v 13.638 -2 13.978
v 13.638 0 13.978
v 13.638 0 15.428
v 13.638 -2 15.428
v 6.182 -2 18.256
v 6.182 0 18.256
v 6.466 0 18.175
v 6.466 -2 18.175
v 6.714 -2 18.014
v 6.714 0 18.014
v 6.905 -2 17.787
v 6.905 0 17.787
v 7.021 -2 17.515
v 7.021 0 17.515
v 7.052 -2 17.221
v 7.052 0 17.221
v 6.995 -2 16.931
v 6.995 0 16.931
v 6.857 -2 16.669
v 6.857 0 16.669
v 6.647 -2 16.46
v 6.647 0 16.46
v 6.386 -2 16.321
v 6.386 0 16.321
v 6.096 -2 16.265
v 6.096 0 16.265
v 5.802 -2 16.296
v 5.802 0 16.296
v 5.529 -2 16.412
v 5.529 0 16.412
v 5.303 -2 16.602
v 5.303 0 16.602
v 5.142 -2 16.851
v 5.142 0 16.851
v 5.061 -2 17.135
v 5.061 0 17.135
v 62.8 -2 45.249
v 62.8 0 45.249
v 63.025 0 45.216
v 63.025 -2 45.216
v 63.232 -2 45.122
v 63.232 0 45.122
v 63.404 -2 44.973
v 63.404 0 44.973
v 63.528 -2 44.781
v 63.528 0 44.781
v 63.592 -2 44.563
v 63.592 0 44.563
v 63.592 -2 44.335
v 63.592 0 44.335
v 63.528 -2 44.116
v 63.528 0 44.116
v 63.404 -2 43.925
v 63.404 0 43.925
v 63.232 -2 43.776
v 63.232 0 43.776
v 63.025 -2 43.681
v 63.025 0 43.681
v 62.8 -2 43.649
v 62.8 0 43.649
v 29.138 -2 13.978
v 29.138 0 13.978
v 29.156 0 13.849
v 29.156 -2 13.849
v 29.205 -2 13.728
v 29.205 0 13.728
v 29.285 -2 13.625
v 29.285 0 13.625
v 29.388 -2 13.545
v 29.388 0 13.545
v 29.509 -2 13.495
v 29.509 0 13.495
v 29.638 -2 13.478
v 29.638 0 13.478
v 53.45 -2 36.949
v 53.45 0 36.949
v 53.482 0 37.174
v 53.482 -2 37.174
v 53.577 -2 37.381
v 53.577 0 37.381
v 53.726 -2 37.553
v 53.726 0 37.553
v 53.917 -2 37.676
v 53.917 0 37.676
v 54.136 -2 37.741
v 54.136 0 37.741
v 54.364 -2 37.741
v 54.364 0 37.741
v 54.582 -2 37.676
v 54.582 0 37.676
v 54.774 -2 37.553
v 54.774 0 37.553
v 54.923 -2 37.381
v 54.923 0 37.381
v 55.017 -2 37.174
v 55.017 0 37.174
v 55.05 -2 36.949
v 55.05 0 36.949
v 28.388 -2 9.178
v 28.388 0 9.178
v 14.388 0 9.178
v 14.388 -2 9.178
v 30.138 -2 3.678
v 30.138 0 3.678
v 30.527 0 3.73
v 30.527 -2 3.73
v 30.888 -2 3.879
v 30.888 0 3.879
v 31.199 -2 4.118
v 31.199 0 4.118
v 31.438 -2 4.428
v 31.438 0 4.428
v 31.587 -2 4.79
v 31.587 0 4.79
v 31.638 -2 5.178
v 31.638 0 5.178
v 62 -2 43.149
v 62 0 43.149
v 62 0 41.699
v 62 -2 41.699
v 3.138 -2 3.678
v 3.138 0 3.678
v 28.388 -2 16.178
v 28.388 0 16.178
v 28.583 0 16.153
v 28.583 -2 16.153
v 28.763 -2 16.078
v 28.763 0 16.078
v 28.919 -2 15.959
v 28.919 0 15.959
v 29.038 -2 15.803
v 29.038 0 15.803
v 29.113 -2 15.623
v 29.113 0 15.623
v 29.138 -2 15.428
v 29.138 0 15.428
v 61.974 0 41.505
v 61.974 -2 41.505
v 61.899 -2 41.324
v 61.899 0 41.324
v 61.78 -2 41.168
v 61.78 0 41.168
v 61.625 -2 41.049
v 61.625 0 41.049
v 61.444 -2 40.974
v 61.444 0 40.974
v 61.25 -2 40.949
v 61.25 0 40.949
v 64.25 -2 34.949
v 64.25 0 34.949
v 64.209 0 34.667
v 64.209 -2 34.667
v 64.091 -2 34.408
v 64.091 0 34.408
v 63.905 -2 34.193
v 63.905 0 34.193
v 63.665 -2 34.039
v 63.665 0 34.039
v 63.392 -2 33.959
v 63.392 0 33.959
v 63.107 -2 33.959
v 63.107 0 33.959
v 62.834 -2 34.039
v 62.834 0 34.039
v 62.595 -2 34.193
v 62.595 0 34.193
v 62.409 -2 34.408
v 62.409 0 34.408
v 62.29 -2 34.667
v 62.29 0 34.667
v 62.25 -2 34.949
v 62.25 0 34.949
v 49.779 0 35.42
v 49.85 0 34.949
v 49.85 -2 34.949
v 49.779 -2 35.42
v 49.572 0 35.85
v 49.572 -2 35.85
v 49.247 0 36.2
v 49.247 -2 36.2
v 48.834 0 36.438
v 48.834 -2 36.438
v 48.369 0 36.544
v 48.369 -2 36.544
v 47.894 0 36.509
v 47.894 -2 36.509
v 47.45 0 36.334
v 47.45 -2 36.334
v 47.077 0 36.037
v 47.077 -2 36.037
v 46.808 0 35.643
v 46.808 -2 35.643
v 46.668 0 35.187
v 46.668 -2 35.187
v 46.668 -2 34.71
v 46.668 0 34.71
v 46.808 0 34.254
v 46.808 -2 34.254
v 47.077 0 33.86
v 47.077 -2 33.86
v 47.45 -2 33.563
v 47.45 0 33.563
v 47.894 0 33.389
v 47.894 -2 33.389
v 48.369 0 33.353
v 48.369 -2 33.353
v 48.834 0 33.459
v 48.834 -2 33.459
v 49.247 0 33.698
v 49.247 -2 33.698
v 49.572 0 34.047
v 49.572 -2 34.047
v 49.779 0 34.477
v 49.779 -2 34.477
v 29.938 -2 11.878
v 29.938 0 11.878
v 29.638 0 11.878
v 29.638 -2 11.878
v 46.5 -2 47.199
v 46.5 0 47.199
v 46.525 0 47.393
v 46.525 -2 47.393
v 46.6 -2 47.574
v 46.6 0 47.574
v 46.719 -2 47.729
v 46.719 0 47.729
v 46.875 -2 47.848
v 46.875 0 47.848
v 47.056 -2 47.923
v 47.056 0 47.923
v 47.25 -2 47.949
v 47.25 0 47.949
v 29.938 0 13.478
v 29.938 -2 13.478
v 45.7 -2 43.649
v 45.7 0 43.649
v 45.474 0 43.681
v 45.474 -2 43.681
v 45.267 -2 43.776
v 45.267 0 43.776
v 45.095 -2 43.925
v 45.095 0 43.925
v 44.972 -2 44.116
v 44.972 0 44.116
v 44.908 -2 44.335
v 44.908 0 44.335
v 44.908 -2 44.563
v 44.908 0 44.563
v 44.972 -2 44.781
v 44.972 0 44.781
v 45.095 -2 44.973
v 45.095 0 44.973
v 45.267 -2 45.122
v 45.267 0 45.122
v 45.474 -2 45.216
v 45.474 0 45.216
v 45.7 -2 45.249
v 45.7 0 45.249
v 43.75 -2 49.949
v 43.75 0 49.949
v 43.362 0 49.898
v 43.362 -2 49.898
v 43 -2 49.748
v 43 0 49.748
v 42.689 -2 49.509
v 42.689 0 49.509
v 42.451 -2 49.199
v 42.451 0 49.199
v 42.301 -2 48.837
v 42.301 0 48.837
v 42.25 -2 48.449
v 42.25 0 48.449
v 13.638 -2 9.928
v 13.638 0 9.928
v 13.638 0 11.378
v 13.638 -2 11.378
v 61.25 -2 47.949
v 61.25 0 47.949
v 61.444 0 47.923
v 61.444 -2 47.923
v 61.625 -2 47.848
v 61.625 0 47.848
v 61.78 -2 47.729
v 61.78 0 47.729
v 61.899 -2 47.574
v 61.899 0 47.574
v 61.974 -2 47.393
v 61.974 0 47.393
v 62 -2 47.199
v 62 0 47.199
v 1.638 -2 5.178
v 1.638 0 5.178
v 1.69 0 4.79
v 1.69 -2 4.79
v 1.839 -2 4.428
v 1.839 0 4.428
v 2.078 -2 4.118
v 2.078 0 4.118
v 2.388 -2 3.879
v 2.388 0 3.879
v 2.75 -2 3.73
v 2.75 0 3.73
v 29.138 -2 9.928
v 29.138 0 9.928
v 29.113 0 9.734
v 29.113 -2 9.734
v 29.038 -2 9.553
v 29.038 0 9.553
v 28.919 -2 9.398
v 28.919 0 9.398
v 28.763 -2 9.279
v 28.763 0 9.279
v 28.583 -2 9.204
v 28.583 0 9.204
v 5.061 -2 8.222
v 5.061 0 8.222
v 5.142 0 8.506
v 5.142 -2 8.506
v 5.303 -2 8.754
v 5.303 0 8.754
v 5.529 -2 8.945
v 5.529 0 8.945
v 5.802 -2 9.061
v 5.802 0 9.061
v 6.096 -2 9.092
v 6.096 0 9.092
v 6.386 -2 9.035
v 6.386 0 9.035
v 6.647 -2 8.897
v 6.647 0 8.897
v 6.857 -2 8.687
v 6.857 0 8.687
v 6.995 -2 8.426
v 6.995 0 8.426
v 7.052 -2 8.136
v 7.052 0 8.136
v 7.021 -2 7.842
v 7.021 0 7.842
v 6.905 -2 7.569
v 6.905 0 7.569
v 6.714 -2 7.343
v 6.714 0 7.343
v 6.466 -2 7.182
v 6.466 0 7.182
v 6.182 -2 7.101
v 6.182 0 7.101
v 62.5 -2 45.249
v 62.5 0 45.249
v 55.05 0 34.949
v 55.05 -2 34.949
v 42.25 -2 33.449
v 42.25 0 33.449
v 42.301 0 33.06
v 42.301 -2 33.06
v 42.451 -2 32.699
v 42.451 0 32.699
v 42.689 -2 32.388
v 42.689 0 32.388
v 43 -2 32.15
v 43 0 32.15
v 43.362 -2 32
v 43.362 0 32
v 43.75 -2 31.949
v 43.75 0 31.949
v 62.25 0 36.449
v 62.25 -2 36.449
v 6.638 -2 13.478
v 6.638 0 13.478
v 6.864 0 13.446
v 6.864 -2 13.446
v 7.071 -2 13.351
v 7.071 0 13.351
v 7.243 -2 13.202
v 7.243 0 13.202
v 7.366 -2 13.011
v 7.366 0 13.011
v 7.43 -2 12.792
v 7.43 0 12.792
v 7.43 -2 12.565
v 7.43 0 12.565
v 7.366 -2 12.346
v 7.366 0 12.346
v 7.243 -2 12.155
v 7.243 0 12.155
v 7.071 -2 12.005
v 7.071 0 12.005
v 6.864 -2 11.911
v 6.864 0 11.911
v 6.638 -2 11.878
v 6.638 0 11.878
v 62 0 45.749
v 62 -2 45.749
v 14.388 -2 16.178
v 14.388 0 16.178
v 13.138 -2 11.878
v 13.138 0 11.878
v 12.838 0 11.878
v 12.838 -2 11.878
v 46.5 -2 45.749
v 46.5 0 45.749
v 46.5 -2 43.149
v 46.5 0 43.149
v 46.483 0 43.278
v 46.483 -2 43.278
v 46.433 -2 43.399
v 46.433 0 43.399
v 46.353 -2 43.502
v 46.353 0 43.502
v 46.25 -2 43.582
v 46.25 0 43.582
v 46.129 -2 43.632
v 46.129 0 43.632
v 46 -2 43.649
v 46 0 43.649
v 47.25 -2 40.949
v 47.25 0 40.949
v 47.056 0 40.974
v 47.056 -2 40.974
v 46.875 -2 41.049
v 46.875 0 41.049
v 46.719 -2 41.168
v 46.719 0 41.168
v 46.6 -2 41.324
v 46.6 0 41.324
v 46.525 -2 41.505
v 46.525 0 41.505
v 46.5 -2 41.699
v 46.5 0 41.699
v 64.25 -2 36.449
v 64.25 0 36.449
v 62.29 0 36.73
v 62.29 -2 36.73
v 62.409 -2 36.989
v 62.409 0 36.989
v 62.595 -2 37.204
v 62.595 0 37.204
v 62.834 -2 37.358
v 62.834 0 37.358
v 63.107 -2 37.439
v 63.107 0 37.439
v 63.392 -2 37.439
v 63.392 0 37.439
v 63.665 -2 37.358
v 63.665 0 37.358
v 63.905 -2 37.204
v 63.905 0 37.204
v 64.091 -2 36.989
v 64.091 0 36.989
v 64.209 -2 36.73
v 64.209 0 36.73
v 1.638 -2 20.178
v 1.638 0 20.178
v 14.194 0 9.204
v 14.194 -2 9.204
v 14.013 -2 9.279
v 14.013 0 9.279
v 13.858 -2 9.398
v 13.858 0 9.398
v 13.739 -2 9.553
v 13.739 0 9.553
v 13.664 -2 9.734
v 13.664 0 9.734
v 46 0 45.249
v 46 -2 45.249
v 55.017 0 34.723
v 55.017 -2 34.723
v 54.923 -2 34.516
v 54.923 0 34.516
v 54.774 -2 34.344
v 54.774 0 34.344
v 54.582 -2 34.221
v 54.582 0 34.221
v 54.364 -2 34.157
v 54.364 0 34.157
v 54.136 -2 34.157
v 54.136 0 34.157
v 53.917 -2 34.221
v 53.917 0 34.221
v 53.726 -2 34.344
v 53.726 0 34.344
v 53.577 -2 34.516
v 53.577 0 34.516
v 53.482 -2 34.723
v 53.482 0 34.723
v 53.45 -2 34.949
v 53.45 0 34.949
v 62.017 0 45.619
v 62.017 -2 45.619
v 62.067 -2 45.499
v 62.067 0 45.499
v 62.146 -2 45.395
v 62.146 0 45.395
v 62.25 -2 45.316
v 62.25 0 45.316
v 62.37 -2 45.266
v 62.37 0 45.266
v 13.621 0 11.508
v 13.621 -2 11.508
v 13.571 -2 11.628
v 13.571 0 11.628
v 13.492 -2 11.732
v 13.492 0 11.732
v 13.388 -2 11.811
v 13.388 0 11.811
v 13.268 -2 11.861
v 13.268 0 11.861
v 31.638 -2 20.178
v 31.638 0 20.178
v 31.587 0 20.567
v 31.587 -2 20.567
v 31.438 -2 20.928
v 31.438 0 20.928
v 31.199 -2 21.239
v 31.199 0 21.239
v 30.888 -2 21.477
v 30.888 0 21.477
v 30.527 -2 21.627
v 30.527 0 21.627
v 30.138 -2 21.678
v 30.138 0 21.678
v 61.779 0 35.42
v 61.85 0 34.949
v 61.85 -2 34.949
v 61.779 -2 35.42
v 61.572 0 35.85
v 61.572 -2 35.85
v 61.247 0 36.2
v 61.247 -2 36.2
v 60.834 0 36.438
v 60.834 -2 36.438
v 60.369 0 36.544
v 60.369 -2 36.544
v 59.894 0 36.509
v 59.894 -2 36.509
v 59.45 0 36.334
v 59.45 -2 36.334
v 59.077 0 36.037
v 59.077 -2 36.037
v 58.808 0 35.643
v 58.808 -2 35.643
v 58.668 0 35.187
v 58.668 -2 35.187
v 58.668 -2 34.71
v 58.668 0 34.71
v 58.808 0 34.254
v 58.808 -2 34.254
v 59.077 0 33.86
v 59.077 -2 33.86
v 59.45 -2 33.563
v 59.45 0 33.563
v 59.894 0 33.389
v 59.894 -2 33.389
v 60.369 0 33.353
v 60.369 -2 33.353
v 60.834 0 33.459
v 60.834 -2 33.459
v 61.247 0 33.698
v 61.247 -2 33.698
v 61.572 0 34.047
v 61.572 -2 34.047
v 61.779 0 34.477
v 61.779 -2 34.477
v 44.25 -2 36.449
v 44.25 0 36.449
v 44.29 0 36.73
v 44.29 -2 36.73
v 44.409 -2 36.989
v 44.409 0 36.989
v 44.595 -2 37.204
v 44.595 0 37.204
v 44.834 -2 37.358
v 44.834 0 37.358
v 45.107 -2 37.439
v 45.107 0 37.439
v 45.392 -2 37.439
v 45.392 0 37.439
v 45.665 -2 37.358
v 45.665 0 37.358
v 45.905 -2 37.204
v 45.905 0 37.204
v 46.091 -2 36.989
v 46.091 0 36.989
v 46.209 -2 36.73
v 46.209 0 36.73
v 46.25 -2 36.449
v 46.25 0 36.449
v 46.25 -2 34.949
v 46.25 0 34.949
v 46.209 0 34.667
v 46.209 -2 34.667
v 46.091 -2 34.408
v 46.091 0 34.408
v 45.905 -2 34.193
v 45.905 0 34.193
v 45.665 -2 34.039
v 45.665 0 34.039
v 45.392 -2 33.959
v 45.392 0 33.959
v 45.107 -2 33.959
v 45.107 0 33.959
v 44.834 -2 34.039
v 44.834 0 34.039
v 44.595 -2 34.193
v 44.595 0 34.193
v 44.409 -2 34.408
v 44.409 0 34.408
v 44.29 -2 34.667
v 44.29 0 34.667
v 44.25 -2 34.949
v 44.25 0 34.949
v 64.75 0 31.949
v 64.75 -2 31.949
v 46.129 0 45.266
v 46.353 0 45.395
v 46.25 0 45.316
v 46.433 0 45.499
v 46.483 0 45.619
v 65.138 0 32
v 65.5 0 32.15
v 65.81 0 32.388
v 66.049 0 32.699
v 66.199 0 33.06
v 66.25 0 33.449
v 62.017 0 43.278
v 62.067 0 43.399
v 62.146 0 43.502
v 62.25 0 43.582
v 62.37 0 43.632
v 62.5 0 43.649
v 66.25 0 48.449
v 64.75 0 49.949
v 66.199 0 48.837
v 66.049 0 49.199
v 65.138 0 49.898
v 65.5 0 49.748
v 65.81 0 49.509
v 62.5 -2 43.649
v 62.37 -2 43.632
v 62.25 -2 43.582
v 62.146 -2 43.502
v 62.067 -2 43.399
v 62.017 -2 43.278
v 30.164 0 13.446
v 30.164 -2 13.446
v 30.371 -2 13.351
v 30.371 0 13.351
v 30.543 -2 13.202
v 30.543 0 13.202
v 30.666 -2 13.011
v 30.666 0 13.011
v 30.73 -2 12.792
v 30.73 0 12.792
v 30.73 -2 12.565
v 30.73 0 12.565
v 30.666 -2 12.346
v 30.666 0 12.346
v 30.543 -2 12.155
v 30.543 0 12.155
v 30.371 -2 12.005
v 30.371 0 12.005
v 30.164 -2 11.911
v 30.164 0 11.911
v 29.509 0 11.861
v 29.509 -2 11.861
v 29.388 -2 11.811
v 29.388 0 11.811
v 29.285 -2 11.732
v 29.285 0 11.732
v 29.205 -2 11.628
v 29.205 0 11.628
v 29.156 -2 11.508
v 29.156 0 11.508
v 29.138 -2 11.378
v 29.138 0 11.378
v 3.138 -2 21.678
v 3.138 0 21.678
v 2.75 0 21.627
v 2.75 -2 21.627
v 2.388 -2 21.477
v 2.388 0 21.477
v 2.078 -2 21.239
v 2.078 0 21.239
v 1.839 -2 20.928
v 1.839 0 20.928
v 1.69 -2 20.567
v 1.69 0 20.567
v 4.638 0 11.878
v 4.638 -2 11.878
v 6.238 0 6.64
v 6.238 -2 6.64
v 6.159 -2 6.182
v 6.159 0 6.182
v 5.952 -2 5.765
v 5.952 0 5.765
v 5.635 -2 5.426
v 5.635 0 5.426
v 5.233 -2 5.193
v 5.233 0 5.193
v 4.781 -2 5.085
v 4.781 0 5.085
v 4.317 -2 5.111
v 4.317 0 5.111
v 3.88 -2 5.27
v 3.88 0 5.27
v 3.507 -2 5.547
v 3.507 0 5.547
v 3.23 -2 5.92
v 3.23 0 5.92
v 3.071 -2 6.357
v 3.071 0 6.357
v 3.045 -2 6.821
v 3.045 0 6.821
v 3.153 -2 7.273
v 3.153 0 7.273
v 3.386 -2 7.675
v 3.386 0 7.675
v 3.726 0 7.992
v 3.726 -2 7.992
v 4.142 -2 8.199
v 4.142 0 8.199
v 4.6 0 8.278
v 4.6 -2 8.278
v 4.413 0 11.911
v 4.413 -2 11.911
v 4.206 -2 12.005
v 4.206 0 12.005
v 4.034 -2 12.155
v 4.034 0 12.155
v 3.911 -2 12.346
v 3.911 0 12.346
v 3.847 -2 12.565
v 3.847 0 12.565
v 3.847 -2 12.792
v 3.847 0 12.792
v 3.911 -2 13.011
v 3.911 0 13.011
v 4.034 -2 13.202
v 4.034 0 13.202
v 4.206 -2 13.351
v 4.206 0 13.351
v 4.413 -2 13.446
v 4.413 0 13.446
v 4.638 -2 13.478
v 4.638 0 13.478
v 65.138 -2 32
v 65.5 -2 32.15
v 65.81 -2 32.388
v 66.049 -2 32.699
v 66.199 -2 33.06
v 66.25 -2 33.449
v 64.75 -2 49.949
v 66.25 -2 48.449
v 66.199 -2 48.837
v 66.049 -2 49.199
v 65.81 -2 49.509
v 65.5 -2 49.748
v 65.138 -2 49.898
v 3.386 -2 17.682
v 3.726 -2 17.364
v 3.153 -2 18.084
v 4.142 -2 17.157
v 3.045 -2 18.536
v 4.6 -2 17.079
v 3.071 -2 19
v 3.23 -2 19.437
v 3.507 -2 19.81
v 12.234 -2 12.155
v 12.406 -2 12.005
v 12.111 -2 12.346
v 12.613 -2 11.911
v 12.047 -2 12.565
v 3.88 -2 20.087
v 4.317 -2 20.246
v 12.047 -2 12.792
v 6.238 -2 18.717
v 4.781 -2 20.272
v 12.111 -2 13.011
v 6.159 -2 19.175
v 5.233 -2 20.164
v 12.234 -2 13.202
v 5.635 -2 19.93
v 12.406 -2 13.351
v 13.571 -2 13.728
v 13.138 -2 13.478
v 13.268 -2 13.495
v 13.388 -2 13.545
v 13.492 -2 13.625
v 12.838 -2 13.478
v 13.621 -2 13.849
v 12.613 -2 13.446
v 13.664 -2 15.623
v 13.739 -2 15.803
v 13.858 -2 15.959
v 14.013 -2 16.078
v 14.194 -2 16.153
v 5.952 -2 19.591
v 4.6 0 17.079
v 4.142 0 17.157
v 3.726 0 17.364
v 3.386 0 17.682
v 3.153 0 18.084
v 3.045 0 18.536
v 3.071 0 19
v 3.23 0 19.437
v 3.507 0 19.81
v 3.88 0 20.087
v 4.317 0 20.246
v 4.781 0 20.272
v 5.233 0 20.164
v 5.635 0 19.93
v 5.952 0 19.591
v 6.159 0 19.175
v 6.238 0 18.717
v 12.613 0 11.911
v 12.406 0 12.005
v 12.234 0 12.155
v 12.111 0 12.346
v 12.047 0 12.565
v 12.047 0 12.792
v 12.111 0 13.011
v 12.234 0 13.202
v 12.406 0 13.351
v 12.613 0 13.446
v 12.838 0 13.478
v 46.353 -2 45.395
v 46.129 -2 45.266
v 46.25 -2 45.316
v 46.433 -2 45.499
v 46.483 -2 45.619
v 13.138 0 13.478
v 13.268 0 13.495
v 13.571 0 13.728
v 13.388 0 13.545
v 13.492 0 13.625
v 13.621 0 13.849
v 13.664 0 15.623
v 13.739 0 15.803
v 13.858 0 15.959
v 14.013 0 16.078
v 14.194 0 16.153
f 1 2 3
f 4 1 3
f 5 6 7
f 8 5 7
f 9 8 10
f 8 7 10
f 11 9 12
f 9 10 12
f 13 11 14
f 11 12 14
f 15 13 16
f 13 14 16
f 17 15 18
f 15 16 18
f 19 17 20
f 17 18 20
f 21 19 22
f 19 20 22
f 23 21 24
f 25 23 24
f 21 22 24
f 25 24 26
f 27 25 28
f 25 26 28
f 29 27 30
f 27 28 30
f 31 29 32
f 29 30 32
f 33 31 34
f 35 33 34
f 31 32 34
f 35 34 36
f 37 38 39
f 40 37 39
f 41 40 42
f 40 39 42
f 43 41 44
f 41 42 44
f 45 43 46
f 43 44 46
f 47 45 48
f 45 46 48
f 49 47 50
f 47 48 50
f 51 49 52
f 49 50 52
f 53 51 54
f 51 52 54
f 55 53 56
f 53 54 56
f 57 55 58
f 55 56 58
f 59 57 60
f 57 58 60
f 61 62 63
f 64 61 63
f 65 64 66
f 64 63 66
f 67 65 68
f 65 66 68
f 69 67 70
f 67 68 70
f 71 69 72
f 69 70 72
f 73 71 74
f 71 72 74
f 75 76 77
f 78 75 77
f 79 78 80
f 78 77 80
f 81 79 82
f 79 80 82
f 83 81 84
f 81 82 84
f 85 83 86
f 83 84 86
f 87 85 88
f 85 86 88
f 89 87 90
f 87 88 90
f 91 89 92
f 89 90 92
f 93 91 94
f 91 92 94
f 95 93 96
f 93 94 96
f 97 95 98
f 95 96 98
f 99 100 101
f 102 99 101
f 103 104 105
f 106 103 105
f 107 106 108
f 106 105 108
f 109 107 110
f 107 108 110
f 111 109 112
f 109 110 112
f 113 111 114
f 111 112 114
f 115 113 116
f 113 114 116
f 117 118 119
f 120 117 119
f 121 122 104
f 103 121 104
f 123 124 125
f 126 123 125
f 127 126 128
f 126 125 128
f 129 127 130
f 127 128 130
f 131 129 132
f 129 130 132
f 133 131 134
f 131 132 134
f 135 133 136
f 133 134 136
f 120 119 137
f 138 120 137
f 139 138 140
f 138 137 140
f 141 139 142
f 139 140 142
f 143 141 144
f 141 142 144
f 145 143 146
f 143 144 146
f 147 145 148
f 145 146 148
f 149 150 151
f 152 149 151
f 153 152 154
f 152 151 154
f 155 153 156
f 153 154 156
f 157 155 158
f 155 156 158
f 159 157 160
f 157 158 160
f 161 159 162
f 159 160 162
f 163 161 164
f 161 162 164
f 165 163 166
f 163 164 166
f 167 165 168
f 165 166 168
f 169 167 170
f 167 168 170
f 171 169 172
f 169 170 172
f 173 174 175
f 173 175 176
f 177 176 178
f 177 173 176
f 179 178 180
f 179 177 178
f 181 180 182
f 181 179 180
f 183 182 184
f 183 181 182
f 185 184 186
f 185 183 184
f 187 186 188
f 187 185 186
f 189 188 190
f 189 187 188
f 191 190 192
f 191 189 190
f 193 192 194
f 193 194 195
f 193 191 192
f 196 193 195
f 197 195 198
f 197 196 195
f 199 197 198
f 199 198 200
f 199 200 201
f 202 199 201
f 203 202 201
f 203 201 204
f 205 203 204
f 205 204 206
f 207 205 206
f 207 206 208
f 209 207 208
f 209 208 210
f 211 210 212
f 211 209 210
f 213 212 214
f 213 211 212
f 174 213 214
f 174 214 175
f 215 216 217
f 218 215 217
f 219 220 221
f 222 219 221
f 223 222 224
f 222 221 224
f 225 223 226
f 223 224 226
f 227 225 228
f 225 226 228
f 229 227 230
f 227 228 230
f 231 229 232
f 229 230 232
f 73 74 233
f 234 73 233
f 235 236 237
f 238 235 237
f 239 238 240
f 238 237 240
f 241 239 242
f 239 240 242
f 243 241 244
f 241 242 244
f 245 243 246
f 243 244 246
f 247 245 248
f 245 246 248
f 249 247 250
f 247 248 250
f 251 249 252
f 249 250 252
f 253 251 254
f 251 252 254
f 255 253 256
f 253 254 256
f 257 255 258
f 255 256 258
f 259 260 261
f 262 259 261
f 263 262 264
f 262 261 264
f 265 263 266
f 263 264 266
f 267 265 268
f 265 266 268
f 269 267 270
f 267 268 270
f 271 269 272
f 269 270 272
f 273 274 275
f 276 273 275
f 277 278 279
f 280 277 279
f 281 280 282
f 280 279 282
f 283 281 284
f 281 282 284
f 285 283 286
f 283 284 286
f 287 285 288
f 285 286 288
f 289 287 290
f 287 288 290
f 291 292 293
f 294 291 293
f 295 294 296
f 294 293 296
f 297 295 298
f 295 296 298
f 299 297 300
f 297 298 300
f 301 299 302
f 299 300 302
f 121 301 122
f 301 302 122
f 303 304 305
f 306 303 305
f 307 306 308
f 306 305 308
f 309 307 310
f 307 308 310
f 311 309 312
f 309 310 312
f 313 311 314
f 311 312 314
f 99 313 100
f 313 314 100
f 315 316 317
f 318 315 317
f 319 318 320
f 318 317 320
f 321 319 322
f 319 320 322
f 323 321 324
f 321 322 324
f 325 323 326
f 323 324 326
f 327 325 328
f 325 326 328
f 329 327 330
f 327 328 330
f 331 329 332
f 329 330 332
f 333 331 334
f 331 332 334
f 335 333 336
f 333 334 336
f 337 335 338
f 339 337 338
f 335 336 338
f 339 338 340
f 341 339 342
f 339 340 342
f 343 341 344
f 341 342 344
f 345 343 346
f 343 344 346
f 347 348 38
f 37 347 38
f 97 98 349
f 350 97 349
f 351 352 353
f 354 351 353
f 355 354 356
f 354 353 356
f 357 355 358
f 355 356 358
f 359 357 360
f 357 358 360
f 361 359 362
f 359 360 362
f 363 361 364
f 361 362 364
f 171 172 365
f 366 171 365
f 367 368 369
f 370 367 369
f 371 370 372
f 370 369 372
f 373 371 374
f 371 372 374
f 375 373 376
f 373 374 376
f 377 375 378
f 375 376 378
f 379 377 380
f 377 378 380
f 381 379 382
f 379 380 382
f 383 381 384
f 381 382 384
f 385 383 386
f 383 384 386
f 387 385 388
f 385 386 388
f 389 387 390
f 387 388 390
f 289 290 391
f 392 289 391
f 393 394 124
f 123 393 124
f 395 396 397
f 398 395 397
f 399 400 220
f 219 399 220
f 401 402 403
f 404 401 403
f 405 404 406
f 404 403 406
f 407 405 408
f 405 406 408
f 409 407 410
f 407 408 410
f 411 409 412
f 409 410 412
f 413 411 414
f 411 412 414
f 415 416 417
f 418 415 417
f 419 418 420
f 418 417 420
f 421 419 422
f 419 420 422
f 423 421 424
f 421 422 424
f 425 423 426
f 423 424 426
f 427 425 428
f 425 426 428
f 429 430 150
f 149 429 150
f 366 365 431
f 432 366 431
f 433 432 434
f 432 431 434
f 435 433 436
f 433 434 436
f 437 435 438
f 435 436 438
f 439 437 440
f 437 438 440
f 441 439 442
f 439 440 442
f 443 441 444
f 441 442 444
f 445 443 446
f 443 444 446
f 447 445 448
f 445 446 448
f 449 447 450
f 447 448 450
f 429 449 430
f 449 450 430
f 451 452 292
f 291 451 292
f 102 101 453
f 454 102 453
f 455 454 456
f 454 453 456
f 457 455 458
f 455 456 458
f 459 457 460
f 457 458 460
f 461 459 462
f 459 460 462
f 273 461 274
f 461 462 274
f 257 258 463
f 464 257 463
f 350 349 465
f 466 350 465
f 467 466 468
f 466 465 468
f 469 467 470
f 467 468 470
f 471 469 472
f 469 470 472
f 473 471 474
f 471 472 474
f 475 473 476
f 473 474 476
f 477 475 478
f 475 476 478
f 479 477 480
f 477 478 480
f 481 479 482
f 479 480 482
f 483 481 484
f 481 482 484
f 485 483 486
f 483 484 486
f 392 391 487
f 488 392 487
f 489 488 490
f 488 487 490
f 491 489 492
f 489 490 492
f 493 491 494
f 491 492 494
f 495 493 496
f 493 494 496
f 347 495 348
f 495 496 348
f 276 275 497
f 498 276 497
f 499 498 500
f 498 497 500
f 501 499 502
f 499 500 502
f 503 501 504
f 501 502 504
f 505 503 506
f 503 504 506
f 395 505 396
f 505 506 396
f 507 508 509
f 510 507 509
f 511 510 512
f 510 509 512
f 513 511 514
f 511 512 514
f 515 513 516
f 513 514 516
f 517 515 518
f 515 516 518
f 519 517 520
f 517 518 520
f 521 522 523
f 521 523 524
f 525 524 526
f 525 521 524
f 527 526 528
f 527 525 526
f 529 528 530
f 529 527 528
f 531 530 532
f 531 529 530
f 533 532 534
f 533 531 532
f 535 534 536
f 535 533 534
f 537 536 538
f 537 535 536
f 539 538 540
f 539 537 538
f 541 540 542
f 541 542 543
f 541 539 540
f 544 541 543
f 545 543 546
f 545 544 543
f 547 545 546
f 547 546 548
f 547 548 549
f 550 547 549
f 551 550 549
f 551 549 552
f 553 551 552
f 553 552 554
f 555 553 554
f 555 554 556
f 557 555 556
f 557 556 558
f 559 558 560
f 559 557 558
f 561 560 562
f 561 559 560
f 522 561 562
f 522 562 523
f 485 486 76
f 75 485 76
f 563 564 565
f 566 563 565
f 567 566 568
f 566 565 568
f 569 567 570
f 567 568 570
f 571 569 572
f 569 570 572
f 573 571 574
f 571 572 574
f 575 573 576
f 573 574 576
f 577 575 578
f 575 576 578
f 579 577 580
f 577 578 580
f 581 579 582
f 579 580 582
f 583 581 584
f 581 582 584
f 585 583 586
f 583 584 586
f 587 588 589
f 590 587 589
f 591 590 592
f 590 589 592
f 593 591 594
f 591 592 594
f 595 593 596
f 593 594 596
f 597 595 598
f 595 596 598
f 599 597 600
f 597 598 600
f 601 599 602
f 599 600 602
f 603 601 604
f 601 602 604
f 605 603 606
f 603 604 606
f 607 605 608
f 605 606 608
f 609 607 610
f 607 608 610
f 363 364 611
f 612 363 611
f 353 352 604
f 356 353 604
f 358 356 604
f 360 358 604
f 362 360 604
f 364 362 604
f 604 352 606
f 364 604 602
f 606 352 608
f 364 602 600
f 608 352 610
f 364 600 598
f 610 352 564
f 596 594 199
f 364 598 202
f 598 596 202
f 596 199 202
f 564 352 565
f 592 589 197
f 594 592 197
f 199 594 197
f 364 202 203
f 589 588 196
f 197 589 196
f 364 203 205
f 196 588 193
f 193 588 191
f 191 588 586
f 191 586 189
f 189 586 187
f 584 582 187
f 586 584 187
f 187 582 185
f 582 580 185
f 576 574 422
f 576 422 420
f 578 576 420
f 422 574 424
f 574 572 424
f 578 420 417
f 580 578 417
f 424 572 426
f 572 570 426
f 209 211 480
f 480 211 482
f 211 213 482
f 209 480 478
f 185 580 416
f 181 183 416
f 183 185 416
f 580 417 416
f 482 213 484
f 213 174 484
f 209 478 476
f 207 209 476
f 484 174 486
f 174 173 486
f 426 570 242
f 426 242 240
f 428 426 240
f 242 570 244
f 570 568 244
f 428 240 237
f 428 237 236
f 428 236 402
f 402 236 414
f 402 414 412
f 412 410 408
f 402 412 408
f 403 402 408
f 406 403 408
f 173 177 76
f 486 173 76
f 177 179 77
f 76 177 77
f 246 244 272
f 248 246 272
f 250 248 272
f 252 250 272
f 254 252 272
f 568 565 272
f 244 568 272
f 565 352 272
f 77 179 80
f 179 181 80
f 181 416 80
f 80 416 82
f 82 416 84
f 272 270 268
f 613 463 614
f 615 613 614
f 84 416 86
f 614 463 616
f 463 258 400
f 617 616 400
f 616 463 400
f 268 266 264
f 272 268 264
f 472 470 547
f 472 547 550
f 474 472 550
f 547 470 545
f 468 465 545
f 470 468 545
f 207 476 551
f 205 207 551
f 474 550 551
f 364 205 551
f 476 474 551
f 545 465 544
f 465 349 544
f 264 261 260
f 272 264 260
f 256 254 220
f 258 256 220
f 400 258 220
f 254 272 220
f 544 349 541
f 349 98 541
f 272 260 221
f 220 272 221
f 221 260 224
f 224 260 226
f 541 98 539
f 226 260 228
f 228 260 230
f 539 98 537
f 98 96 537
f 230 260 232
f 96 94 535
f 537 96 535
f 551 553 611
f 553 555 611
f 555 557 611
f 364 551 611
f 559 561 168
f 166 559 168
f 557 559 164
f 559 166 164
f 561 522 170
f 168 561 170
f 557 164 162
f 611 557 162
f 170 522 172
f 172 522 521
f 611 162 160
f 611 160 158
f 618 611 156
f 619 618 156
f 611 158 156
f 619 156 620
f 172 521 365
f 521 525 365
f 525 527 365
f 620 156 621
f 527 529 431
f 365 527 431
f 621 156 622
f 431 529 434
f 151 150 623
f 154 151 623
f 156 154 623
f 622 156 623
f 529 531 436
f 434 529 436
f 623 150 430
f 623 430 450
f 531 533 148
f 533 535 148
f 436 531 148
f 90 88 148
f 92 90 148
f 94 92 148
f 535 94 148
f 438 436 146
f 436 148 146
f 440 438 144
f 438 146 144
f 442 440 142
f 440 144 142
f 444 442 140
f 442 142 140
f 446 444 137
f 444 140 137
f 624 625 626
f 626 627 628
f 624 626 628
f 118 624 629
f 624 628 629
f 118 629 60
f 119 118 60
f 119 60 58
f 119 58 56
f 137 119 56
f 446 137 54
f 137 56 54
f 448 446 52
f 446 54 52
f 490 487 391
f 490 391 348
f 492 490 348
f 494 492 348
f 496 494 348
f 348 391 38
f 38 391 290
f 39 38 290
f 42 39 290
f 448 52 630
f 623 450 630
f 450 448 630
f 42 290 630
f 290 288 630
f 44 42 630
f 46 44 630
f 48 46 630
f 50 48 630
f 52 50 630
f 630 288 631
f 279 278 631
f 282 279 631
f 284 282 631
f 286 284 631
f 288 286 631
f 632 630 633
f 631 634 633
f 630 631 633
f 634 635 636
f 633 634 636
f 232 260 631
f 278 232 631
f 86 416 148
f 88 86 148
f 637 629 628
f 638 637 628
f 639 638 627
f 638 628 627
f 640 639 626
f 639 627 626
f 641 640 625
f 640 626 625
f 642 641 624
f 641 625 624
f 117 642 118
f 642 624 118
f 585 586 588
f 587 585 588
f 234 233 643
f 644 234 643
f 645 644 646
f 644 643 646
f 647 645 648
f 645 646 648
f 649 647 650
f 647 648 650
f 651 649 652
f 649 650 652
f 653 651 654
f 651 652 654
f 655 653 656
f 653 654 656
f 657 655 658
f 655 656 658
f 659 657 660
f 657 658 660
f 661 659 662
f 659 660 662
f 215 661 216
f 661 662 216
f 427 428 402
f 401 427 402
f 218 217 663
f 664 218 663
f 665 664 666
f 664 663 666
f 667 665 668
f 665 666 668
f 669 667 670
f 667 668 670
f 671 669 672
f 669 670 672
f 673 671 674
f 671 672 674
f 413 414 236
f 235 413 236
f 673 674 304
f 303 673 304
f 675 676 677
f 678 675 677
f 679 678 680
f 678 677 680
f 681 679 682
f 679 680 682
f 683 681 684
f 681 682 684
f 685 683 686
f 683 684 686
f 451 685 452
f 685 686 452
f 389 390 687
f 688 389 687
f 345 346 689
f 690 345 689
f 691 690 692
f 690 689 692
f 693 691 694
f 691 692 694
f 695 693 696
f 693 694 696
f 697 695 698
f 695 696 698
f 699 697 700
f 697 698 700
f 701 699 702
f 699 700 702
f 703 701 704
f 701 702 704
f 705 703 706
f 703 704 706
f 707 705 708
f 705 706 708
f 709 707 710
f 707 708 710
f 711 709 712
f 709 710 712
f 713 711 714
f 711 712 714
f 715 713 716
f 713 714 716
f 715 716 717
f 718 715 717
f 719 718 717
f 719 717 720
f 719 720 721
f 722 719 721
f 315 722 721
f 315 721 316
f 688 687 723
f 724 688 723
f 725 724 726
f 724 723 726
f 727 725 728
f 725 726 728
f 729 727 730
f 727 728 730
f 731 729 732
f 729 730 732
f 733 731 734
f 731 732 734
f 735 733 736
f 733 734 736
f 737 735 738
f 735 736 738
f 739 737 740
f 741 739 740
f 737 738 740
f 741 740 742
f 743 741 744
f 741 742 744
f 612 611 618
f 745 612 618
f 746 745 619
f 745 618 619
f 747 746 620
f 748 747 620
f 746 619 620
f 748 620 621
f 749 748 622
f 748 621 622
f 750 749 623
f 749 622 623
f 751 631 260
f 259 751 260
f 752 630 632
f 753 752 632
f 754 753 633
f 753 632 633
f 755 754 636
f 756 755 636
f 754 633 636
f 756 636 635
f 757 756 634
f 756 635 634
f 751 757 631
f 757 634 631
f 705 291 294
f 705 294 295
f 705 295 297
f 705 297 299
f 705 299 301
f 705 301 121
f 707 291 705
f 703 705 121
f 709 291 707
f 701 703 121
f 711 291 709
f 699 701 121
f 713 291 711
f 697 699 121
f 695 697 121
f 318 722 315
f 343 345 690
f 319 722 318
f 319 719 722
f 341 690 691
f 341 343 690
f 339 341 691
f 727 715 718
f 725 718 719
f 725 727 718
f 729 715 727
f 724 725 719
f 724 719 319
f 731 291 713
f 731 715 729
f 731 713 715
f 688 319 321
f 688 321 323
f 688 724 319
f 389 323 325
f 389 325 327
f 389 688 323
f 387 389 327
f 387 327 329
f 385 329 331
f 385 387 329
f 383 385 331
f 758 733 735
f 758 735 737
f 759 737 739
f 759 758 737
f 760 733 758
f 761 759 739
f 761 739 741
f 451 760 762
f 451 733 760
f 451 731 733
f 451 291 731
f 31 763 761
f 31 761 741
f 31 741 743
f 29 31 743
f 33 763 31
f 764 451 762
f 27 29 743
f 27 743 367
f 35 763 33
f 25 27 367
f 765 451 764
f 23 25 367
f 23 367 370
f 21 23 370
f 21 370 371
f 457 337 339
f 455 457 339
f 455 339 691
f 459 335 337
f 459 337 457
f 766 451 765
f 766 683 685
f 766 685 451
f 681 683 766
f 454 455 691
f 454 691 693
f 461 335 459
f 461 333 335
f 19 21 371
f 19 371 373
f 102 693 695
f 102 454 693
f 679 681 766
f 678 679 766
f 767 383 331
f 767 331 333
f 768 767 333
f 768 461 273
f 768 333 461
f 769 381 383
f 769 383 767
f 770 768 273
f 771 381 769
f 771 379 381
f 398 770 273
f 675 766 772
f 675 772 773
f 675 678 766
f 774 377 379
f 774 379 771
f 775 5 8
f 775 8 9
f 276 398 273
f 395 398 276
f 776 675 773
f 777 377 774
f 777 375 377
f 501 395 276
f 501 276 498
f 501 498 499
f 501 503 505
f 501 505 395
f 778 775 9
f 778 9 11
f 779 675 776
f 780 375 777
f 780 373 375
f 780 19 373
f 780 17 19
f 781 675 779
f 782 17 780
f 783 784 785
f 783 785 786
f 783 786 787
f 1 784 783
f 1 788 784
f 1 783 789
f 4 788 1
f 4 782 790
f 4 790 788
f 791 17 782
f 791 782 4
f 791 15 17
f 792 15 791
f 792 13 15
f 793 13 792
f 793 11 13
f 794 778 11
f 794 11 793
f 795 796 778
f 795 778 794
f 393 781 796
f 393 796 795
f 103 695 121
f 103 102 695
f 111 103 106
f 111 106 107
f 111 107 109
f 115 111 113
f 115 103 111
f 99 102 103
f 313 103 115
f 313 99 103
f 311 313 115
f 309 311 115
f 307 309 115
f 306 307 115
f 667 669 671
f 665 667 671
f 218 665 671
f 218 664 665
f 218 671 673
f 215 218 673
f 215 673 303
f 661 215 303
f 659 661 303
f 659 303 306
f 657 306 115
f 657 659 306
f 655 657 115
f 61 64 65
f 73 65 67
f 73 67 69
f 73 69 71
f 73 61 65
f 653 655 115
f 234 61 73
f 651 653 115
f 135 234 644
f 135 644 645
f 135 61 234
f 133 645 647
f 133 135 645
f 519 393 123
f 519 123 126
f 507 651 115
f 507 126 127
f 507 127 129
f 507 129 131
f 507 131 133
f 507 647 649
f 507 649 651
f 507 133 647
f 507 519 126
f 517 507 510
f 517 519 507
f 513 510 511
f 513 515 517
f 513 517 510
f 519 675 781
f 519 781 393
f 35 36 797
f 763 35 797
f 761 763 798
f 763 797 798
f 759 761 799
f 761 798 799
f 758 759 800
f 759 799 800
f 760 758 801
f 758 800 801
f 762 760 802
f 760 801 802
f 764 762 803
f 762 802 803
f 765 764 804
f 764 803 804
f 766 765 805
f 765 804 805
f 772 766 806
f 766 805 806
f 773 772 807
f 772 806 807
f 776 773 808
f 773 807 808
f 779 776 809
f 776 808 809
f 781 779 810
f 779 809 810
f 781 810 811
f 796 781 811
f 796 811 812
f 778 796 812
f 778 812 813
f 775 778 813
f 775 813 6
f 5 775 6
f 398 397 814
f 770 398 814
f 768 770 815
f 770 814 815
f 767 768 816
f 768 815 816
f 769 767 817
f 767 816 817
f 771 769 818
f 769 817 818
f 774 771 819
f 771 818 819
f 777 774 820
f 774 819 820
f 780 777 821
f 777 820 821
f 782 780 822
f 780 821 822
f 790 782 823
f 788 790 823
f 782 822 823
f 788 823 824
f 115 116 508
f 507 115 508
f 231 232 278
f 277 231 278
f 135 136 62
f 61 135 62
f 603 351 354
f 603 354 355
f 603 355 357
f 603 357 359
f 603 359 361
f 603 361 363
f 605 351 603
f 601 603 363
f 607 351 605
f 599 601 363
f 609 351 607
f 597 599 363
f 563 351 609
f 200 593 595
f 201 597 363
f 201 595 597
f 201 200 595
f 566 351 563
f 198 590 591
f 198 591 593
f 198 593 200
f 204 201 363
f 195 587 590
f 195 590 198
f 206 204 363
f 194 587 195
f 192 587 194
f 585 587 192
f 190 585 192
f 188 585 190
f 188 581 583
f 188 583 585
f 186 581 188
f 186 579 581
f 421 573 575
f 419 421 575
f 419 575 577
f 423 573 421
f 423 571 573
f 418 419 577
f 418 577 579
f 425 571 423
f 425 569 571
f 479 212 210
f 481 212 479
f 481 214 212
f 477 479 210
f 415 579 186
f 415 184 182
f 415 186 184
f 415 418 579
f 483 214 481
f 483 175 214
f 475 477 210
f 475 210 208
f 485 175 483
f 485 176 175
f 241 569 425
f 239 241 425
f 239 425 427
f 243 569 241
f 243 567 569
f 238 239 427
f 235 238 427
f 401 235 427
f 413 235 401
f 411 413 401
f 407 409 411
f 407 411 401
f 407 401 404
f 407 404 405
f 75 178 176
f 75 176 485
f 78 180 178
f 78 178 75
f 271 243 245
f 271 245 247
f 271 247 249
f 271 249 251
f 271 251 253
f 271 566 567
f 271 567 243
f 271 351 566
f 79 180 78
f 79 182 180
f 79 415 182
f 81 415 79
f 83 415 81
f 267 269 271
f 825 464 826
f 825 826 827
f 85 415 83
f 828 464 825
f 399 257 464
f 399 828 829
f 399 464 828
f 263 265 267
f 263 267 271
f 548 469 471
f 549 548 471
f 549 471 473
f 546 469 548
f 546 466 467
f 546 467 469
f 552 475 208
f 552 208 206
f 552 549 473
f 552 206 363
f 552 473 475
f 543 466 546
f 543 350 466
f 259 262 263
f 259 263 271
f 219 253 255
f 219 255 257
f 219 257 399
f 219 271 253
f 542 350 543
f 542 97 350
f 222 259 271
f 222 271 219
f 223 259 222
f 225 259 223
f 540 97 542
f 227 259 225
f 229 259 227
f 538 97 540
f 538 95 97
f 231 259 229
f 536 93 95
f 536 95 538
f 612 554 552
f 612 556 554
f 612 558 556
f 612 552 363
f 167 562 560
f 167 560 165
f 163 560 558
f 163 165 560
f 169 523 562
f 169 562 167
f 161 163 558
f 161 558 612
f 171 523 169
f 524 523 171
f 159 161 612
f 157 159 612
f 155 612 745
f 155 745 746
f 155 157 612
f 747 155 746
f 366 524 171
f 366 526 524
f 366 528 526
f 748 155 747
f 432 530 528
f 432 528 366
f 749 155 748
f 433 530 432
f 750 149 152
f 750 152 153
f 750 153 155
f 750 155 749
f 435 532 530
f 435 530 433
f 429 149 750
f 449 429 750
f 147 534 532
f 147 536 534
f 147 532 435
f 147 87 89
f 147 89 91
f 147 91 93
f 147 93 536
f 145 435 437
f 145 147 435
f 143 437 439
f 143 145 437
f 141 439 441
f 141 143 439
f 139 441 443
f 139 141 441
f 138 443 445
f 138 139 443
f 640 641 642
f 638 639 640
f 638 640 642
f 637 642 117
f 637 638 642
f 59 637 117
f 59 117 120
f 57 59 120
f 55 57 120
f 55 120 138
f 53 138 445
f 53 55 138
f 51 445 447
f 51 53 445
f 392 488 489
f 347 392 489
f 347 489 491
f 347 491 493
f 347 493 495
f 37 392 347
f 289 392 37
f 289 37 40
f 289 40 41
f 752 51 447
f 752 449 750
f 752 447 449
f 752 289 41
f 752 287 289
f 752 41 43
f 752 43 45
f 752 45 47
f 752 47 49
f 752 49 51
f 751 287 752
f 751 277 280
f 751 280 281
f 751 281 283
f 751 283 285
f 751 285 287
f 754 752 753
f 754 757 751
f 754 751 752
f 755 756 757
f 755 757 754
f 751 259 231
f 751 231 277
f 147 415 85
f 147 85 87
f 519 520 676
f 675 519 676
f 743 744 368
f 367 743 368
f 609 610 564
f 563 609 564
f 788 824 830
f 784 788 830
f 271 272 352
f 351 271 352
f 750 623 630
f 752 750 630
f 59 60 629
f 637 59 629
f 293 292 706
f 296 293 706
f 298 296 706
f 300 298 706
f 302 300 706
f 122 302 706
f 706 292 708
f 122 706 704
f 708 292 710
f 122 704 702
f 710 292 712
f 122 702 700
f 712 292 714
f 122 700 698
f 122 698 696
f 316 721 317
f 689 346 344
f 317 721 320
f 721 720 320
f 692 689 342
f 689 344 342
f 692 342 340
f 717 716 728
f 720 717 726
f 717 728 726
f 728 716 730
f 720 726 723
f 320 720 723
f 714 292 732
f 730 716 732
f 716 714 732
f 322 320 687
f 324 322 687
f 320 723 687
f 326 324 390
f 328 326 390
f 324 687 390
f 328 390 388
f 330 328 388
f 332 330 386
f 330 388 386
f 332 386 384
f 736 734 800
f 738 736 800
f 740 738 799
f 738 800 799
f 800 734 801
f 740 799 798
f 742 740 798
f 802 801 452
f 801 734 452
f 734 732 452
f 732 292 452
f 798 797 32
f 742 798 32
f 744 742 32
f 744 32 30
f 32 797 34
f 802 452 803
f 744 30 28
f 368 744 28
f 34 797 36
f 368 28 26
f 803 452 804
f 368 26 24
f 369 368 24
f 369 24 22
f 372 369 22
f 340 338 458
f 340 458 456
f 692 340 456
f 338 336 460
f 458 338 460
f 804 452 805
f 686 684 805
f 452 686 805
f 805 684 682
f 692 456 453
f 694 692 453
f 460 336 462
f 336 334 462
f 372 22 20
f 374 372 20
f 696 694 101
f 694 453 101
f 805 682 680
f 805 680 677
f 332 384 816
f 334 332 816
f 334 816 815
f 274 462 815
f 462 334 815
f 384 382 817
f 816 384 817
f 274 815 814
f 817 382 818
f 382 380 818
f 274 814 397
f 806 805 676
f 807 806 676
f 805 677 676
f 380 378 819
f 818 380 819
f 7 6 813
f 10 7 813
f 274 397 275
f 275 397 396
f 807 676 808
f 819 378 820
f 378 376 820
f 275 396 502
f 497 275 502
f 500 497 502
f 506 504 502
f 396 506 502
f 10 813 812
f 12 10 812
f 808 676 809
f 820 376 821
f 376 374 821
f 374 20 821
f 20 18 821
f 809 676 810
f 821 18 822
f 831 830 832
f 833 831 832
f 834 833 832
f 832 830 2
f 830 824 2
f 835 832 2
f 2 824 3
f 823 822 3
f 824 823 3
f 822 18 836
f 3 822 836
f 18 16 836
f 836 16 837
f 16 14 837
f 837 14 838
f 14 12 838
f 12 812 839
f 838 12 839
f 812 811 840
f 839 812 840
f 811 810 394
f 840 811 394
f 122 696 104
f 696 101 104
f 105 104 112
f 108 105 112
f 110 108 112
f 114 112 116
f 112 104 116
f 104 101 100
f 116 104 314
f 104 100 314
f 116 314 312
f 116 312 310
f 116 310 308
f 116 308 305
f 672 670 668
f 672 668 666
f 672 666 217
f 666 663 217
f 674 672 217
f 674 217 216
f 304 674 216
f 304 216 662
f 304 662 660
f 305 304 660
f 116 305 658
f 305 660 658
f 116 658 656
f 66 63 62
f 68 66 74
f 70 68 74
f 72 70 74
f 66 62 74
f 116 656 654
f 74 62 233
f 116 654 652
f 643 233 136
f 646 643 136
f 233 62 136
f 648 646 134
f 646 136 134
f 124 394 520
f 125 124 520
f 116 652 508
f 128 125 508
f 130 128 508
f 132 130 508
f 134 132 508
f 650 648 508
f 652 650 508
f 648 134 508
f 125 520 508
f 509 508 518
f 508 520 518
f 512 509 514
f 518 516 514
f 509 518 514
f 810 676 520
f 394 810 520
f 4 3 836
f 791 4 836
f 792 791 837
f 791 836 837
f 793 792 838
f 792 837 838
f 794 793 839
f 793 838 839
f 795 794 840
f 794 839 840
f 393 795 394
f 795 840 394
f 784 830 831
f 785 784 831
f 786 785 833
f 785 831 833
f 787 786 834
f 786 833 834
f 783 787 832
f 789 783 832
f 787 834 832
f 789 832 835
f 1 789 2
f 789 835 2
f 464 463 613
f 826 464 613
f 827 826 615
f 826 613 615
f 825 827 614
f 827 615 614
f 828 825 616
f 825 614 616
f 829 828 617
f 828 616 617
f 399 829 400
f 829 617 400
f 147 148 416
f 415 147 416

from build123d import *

# Parameters (mm, degrees)
F0_R     = 1.6
F1_DEPTH = 2
F2_DEPTH = 2


with BuildPart() as f1:
    # F0 (on Front) → F1 (new body)
    with BuildSketch(Plane.XZ):
        with BuildLine():
            Line((64.749799, 49.948693), (43.749799, 49.948693))
            ThreePointArc((43.749799, 49.948693), (42.689139, 49.509353), (42.249799, 48.448693))
            Line((42.249799, 48.448693), (42.249799, 33.448693))
            ThreePointArc((42.249799, 33.448693), (42.689139, 32.388033), (43.749799, 31.948693))
            Line((43.749799, 31.948693), (64.749799, 31.948693))
            ThreePointArc((64.749799, 31.948693), (65.810459, 32.388033), (66.249799, 33.448693))
            Line((66.249799, 33.448693), (66.249799, 48.448693))
            ThreePointArc((66.249799, 48.448693), (65.810459, 49.509353), (64.749799, 49.948693))
        make_face()
        with Locations((48.249799, 34.948693)):
            Circle(F0_R, mode=Mode.SUBTRACT)
        with BuildLine():
            Line((44.249799, 34.948693), (44.249799, 36.448693))
            ThreePointArc((44.249799, 36.448693), (45.249799, 37.448693), (46.249799, 36.448693))
            Line((46.249799, 36.448693), (46.249799, 34.948693))
            ThreePointArc((46.249799, 34.948693), (45.249799, 33.948693), (44.249799, 34.948693))
        make_face(mode=Mode.SUBTRACT)
        with BuildLine():
            ThreePointArc((53.449799, 36.948693), (54.249799, 37.748693), (55.049799, 36.948693))
            Line((55.049799, 36.948693), (55.049799, 34.948693))
            ThreePointArc((55.049799, 34.948693), (54.249799, 34.148693), (53.449799, 34.948693))
            Line((53.449799, 34.948693), (53.449799, 36.948693))
        make_face(mode=Mode.SUBTRACT)
        with Locations((60.249799, 34.948693)):
            Circle(F0_R, mode=Mode.SUBTRACT)
        with BuildLine():
            Line((62.249799, 34.948693), (62.249799, 36.448693))
            ThreePointArc((62.249799, 36.448693), (63.249799, 37.448693), (64.249799, 36.448693))
            Line((64.249799, 36.448693), (64.249799, 34.948693))
            ThreePointArc((64.249799, 34.948693), (63.249799, 33.948693), (62.249799, 34.948693))
        make_face(mode=Mode.SUBTRACT)
        with BuildLine():
            ThreePointArc((46.499799, 47.198693), (46.719469, 47.729023), (47.249799, 47.948693))
            Line((47.249799, 47.948693), (61.249799, 47.948693))
            ThreePointArc((61.249799, 47.948693), (61.780129, 47.729023), (61.999799, 47.198693))
            Line((61.999799, 47.198693), (61.999799, 45.748693))
            ThreePointArc((61.999799, 45.748693), (62.146245, 45.39514), (62.499799, 45.248693))
            Line((62.499799, 45.248693), (62.799799, 45.248693))
            ThreePointArc((62.799799, 45.248693), (63.599799, 44.448693), (62.799799, 43.648693))
            Line((62.799799, 43.648693), (62.499799, 43.648693))
            ThreePointArc((62.499799, 43.648693), (62.146245, 43.502246), (61.999799, 43.148693))
            Line((61.999799, 43.148693), (61.999799, 41.698693))
            ThreePointArc((61.999799, 41.698693), (61.780129, 41.168363), (61.249799, 40.948693))
            Line((61.249799, 40.948693), (47.249799, 40.948693))
            ThreePointArc((47.249799, 40.948693), (46.719469, 41.168363), (46.499799, 41.698693))
            Line((46.499799, 41.698693), (46.499799, 43.148693))
            ThreePointArc((46.499799, 43.148693), (46.353352, 43.502246), (45.999799, 43.648693))
            Line((45.999799, 43.648693), (45.699799, 43.648693))
            ThreePointArc((45.699799, 43.648693), (44.899799, 44.448693), (45.699799, 45.248693))
            Line((45.699799, 45.248693), (45.999799, 45.248693))
            ThreePointArc((45.999799, 45.248693), (46.353352, 45.39514), (46.499799, 45.748693))
            Line((46.499799, 45.748693), (46.499799, 47.198693))
        make_face(mode=Mode.SUBTRACT)
    extrude(amount=F1_DEPTH)


with BuildPart() as f2:
    # F0 (on Front) → F2 (new body)
    with BuildSketch(Plane.XZ):
        with BuildLine():
            ThreePointArc((1.638466, 5.178403), (2.077806, 4.117743), (3.138466, 3.678403))
            Line((3.138466, 3.678403), (30.138466, 3.678403))
            ThreePointArc((30.138466, 3.678403), (31.199126, 4.117743), (31.638466, 5.178403))
            Line((31.638466, 5.178403), (31.638466, 20.178403))
            ThreePointArc((31.638466, 20.178403), (31.199126, 21.239064), (30.138466, 21.678403))
            Line((30.138466, 21.678403), (3.138466, 21.678403))
            ThreePointArc((3.138466, 21.678403), (2.077806, 21.239064), (1.638466, 20.178403))
            Line((1.638466, 20.178403), (1.638466, 5.178403))
        make_face()
        with BuildLine():
            ThreePointArc((6.181657, 7.100969), (3.507095, 5.547032), (5.061032, 8.221594))
            ThreePointArc((5.061032, 8.221594), (6.759786, 8.799724), (6.181657, 7.100969))
        make_face(mode=Mode.SUBTRACT)
        with BuildLine():
            Line((6.638466, 11.878403), (4.638466, 11.878403))
            ThreePointArc((4.638466, 11.878403), (3.838466, 12.678403), (4.638466, 13.478403))
            Line((4.638466, 13.478403), (6.638466, 13.478403))
            ThreePointArc((6.638466, 13.478403), (7.438466, 12.678403), (6.638466, 11.878403))
        make_face(mode=Mode.SUBTRACT)
        with BuildLine():
            ThreePointArc((13.638466, 15.428403), (13.858136, 15.958733), (14.388466, 16.178403))
            Line((14.388466, 16.178403), (28.388466, 16.178403))
            ThreePointArc((28.388466, 16.178403), (28.918796, 15.958733), (29.138466, 15.428403))
            Line((29.138466, 15.428403), (29.138466, 13.978403))
            ThreePointArc((29.138466, 13.978403), (29.284913, 13.62485), (29.638466, 13.478403))
            Line((29.638466, 13.478403), (29.938466, 13.478403))
            ThreePointArc((29.938466, 13.478403), (30.738466, 12.678403), (29.938466, 11.878403))
            Line((29.938466, 11.878403), (29.638466, 11.878403))
            ThreePointArc((29.638466, 11.878403), (29.284913, 11.731957), (29.138466, 11.378403))
            Line((29.138466, 11.378403), (29.138466, 9.928403))
            ThreePointArc((29.138466, 9.928403), (28.918796, 9.398073), (28.388466, 9.178403))
            Line((28.388466, 9.178403), (14.388466, 9.178403))
            ThreePointArc((14.388466, 9.178403), (13.858136, 9.398073), (13.638466, 9.928403))
            Line((13.638466, 9.928403), (13.638466, 11.378403))
            ThreePointArc((13.638466, 11.378403), (13.492019, 11.731957), (13.138466, 11.878403))
            Line((13.138466, 11.878403), (12.838466, 11.878403))
            ThreePointArc((12.838466, 11.878403), (12.038466, 12.678403), (12.838466, 13.478403))
            Line((12.838466, 13.478403), (13.138466, 13.478403))
            ThreePointArc((13.138466, 13.478403), (13.492019, 13.62485), (13.638466, 13.978403))
            Line((13.638466, 13.978403), (13.638466, 15.428403))
        make_face(mode=Mode.SUBTRACT)
        with BuildLine():
            ThreePointArc((5.061032, 17.135212), (3.507095, 19.809774), (6.181657, 18.255837))
            ThreePointArc((6.181657, 18.255837), (6.759786, 16.557083), (5.061032, 17.135212))
        make_face(mode=Mode.SUBTRACT)
    extrude(amount=F2_DEPTH)


solid = Compound([f1.part, f2.part])
